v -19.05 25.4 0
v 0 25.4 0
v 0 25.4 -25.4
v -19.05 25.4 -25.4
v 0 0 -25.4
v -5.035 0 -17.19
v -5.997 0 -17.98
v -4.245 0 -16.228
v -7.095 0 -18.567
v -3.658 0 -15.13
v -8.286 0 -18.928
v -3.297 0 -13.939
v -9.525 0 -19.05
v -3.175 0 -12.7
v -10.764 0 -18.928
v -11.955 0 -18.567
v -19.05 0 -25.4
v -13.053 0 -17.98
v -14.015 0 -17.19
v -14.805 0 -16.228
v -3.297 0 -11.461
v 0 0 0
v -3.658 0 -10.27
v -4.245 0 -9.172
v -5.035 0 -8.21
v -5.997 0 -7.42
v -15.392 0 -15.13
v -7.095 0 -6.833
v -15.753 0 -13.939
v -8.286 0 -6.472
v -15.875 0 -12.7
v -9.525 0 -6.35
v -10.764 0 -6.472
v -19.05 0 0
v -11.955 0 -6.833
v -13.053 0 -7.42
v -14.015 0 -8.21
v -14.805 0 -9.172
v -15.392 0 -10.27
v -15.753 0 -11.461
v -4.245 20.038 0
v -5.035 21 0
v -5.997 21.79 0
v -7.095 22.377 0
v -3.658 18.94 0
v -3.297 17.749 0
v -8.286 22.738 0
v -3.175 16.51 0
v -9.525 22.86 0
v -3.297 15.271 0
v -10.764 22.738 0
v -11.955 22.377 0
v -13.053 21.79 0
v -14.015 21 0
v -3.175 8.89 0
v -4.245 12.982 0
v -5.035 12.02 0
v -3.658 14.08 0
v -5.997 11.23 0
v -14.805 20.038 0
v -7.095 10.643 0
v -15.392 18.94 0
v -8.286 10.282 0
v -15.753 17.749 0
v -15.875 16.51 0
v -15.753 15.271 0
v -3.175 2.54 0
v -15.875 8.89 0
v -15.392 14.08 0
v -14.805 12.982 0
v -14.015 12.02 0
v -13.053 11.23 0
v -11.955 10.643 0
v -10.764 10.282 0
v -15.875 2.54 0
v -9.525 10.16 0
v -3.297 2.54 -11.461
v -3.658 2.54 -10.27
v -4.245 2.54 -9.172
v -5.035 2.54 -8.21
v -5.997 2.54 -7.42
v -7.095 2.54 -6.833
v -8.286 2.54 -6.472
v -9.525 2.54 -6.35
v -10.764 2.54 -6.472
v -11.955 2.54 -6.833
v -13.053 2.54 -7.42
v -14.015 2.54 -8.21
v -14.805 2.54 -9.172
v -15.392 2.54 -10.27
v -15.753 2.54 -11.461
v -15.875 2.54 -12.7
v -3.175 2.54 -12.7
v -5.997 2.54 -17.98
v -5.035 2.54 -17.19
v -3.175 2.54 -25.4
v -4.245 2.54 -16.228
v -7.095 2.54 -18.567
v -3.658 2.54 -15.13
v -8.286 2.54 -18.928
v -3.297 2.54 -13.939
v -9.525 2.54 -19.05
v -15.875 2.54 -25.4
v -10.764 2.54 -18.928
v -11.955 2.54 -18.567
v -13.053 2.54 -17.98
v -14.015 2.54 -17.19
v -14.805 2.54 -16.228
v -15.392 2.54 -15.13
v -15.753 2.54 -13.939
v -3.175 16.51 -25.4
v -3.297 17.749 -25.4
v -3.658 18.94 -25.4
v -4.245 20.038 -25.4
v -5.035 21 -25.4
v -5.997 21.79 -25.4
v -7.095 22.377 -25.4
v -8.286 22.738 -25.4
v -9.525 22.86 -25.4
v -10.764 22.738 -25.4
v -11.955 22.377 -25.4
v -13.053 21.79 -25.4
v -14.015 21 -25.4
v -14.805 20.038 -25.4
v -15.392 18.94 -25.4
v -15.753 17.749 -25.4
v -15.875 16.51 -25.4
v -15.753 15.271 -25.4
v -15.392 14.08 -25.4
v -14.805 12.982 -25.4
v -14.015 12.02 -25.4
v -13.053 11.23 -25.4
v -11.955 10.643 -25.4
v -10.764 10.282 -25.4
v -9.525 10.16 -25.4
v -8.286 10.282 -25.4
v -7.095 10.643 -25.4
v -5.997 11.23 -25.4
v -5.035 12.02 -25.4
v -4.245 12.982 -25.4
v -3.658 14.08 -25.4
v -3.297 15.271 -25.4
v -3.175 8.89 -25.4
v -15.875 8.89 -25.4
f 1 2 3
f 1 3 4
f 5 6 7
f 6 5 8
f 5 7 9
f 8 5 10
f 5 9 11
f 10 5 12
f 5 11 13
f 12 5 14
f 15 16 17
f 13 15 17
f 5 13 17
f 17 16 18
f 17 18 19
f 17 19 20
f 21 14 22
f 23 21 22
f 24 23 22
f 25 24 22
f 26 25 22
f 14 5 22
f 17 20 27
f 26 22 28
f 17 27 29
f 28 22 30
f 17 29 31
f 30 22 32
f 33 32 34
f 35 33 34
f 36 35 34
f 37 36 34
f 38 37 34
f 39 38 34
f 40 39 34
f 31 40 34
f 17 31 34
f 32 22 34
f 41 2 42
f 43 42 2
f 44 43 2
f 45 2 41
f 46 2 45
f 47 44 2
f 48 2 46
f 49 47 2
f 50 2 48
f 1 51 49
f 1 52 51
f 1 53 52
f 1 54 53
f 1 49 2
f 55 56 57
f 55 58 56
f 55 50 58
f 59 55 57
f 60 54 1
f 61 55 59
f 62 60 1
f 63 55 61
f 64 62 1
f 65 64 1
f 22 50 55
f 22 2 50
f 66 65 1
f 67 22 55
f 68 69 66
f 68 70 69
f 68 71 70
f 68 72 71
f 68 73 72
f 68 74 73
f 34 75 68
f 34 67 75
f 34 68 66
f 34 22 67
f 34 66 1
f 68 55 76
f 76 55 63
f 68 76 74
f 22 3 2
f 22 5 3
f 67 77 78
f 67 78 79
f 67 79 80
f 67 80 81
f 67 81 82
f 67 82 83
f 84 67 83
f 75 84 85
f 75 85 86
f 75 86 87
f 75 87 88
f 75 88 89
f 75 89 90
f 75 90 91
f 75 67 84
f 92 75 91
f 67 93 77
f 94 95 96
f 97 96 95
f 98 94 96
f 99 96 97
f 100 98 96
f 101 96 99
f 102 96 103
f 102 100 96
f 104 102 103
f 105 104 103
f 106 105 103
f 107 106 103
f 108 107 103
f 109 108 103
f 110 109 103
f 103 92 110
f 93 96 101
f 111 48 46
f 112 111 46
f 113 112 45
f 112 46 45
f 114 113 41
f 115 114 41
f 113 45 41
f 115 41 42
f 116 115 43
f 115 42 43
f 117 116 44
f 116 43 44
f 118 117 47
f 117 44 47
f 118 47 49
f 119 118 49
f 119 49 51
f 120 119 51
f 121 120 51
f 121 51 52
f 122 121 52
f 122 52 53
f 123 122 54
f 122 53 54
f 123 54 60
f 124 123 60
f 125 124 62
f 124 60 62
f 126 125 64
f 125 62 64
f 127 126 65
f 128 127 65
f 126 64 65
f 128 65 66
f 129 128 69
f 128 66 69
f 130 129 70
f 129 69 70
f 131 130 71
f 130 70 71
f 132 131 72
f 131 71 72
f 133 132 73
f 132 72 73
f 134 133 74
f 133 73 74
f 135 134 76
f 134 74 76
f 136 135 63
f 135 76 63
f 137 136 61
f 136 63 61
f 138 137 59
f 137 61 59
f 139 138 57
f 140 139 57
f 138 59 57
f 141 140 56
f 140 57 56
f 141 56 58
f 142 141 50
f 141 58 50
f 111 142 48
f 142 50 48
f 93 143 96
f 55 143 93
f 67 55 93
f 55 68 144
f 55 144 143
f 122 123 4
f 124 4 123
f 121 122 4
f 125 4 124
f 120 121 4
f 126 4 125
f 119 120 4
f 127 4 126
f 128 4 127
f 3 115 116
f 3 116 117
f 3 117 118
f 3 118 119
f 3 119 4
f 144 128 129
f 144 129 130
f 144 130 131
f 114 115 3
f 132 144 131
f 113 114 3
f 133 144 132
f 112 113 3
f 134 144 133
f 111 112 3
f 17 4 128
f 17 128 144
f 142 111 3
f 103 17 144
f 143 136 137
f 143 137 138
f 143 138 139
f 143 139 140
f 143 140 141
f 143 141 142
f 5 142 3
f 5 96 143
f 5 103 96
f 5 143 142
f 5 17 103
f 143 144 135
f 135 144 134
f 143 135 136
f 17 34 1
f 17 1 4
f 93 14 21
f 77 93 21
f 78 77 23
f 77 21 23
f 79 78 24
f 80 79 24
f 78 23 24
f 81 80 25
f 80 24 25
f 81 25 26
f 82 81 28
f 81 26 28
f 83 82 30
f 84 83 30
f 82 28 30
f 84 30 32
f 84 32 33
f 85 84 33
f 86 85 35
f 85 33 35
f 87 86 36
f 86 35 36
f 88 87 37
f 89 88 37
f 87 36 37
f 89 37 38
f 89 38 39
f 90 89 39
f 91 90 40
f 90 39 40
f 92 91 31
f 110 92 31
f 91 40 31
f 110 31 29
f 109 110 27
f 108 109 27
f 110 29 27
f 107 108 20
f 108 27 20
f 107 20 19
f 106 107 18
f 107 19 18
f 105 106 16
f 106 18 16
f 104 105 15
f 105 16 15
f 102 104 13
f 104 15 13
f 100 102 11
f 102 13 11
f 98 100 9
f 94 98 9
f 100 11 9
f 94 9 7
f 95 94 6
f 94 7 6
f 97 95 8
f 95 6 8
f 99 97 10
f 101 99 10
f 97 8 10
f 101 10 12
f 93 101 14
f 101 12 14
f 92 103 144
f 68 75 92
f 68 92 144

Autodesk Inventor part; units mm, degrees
ref_plane "YZ Plane" through (0, 0, 0) normal (1, 0, 0) x (0, 1, 0)
ref_plane "XZ Plane" through (0, 0, 0) normal (0, 1, 0) x (-1, 0, 0)
ref_plane "XY Plane" through (0, 0, 0) normal (0, 0, 1) x (1, 0, 0)
sketch "Sketch1" plane through (0, 0, 0) normal (0, 1, 0) x (-1, 0, 0)
  line L0 (0, 0) -> (19.05, 0)
  line L1 (19.05, 0) -> (19.05, -25.4)
  line L2 (19.05, -25.4) -> (0, -25.4)
  line L3 (0, -25.4) -> (0, 0)
  dimension "d0" = 19.05
  dimension "d1" = 25.4
extrude "Extrusion1" add sketch "Sketch1" along normal blind 25.4
sketch "Sketch2" plane through (-19.05, 0, 0) normal (0, 0, 1) x (1, 0, 0)
  circle A0 centre (9.525, 16.51) radius 6.35
  line L0 (0, 25.4) -> (19.05, 25.4) projected
  line L1 (3.175, 8.89) -> (15.875, 8.89)
  line L2 (15.875, 8.89) -> (15.875, 2.54)
  line L3 (15.875, 2.54) -> (3.175, 2.54)
  line L4 (3.175, 2.54) -> (3.175, 8.89)
  line L5 (0, 0) -> (0, 25.4) projected
  line L6 (19.05, 0) -> (19.05, 25.4) projected
  line L7 (19.05, 0) -> (0, 0) projected
  dimension "d4" = 12.7
  dimension "d5" = 8.89
  dimension "d6" = 12.7
  dimension "d7" = 19.05
  dimension "d8" = 6.35
  dimension "d9" = 3.175
  dimension "d10" = 3.175
  dimension "d16" = 2.54
extrude "Extrusion2" cut sketch "Sketch2" against normal blind 25.4 contours A0 | L1 L2 L3 L4
sketch "Sketch3" plane through (0, 0, 0) normal (0, -1, 0) x (1, 0, 0)
  circle A0 centre (-9.525, -12.7) radius 6.35
  point P0 (0, 0)
  dimension "d13" = 12.7
extrude "Extrusion3" cut sketch "Sketch3" against normal blind 3.175
properties part number "Pivot Poin 3"
